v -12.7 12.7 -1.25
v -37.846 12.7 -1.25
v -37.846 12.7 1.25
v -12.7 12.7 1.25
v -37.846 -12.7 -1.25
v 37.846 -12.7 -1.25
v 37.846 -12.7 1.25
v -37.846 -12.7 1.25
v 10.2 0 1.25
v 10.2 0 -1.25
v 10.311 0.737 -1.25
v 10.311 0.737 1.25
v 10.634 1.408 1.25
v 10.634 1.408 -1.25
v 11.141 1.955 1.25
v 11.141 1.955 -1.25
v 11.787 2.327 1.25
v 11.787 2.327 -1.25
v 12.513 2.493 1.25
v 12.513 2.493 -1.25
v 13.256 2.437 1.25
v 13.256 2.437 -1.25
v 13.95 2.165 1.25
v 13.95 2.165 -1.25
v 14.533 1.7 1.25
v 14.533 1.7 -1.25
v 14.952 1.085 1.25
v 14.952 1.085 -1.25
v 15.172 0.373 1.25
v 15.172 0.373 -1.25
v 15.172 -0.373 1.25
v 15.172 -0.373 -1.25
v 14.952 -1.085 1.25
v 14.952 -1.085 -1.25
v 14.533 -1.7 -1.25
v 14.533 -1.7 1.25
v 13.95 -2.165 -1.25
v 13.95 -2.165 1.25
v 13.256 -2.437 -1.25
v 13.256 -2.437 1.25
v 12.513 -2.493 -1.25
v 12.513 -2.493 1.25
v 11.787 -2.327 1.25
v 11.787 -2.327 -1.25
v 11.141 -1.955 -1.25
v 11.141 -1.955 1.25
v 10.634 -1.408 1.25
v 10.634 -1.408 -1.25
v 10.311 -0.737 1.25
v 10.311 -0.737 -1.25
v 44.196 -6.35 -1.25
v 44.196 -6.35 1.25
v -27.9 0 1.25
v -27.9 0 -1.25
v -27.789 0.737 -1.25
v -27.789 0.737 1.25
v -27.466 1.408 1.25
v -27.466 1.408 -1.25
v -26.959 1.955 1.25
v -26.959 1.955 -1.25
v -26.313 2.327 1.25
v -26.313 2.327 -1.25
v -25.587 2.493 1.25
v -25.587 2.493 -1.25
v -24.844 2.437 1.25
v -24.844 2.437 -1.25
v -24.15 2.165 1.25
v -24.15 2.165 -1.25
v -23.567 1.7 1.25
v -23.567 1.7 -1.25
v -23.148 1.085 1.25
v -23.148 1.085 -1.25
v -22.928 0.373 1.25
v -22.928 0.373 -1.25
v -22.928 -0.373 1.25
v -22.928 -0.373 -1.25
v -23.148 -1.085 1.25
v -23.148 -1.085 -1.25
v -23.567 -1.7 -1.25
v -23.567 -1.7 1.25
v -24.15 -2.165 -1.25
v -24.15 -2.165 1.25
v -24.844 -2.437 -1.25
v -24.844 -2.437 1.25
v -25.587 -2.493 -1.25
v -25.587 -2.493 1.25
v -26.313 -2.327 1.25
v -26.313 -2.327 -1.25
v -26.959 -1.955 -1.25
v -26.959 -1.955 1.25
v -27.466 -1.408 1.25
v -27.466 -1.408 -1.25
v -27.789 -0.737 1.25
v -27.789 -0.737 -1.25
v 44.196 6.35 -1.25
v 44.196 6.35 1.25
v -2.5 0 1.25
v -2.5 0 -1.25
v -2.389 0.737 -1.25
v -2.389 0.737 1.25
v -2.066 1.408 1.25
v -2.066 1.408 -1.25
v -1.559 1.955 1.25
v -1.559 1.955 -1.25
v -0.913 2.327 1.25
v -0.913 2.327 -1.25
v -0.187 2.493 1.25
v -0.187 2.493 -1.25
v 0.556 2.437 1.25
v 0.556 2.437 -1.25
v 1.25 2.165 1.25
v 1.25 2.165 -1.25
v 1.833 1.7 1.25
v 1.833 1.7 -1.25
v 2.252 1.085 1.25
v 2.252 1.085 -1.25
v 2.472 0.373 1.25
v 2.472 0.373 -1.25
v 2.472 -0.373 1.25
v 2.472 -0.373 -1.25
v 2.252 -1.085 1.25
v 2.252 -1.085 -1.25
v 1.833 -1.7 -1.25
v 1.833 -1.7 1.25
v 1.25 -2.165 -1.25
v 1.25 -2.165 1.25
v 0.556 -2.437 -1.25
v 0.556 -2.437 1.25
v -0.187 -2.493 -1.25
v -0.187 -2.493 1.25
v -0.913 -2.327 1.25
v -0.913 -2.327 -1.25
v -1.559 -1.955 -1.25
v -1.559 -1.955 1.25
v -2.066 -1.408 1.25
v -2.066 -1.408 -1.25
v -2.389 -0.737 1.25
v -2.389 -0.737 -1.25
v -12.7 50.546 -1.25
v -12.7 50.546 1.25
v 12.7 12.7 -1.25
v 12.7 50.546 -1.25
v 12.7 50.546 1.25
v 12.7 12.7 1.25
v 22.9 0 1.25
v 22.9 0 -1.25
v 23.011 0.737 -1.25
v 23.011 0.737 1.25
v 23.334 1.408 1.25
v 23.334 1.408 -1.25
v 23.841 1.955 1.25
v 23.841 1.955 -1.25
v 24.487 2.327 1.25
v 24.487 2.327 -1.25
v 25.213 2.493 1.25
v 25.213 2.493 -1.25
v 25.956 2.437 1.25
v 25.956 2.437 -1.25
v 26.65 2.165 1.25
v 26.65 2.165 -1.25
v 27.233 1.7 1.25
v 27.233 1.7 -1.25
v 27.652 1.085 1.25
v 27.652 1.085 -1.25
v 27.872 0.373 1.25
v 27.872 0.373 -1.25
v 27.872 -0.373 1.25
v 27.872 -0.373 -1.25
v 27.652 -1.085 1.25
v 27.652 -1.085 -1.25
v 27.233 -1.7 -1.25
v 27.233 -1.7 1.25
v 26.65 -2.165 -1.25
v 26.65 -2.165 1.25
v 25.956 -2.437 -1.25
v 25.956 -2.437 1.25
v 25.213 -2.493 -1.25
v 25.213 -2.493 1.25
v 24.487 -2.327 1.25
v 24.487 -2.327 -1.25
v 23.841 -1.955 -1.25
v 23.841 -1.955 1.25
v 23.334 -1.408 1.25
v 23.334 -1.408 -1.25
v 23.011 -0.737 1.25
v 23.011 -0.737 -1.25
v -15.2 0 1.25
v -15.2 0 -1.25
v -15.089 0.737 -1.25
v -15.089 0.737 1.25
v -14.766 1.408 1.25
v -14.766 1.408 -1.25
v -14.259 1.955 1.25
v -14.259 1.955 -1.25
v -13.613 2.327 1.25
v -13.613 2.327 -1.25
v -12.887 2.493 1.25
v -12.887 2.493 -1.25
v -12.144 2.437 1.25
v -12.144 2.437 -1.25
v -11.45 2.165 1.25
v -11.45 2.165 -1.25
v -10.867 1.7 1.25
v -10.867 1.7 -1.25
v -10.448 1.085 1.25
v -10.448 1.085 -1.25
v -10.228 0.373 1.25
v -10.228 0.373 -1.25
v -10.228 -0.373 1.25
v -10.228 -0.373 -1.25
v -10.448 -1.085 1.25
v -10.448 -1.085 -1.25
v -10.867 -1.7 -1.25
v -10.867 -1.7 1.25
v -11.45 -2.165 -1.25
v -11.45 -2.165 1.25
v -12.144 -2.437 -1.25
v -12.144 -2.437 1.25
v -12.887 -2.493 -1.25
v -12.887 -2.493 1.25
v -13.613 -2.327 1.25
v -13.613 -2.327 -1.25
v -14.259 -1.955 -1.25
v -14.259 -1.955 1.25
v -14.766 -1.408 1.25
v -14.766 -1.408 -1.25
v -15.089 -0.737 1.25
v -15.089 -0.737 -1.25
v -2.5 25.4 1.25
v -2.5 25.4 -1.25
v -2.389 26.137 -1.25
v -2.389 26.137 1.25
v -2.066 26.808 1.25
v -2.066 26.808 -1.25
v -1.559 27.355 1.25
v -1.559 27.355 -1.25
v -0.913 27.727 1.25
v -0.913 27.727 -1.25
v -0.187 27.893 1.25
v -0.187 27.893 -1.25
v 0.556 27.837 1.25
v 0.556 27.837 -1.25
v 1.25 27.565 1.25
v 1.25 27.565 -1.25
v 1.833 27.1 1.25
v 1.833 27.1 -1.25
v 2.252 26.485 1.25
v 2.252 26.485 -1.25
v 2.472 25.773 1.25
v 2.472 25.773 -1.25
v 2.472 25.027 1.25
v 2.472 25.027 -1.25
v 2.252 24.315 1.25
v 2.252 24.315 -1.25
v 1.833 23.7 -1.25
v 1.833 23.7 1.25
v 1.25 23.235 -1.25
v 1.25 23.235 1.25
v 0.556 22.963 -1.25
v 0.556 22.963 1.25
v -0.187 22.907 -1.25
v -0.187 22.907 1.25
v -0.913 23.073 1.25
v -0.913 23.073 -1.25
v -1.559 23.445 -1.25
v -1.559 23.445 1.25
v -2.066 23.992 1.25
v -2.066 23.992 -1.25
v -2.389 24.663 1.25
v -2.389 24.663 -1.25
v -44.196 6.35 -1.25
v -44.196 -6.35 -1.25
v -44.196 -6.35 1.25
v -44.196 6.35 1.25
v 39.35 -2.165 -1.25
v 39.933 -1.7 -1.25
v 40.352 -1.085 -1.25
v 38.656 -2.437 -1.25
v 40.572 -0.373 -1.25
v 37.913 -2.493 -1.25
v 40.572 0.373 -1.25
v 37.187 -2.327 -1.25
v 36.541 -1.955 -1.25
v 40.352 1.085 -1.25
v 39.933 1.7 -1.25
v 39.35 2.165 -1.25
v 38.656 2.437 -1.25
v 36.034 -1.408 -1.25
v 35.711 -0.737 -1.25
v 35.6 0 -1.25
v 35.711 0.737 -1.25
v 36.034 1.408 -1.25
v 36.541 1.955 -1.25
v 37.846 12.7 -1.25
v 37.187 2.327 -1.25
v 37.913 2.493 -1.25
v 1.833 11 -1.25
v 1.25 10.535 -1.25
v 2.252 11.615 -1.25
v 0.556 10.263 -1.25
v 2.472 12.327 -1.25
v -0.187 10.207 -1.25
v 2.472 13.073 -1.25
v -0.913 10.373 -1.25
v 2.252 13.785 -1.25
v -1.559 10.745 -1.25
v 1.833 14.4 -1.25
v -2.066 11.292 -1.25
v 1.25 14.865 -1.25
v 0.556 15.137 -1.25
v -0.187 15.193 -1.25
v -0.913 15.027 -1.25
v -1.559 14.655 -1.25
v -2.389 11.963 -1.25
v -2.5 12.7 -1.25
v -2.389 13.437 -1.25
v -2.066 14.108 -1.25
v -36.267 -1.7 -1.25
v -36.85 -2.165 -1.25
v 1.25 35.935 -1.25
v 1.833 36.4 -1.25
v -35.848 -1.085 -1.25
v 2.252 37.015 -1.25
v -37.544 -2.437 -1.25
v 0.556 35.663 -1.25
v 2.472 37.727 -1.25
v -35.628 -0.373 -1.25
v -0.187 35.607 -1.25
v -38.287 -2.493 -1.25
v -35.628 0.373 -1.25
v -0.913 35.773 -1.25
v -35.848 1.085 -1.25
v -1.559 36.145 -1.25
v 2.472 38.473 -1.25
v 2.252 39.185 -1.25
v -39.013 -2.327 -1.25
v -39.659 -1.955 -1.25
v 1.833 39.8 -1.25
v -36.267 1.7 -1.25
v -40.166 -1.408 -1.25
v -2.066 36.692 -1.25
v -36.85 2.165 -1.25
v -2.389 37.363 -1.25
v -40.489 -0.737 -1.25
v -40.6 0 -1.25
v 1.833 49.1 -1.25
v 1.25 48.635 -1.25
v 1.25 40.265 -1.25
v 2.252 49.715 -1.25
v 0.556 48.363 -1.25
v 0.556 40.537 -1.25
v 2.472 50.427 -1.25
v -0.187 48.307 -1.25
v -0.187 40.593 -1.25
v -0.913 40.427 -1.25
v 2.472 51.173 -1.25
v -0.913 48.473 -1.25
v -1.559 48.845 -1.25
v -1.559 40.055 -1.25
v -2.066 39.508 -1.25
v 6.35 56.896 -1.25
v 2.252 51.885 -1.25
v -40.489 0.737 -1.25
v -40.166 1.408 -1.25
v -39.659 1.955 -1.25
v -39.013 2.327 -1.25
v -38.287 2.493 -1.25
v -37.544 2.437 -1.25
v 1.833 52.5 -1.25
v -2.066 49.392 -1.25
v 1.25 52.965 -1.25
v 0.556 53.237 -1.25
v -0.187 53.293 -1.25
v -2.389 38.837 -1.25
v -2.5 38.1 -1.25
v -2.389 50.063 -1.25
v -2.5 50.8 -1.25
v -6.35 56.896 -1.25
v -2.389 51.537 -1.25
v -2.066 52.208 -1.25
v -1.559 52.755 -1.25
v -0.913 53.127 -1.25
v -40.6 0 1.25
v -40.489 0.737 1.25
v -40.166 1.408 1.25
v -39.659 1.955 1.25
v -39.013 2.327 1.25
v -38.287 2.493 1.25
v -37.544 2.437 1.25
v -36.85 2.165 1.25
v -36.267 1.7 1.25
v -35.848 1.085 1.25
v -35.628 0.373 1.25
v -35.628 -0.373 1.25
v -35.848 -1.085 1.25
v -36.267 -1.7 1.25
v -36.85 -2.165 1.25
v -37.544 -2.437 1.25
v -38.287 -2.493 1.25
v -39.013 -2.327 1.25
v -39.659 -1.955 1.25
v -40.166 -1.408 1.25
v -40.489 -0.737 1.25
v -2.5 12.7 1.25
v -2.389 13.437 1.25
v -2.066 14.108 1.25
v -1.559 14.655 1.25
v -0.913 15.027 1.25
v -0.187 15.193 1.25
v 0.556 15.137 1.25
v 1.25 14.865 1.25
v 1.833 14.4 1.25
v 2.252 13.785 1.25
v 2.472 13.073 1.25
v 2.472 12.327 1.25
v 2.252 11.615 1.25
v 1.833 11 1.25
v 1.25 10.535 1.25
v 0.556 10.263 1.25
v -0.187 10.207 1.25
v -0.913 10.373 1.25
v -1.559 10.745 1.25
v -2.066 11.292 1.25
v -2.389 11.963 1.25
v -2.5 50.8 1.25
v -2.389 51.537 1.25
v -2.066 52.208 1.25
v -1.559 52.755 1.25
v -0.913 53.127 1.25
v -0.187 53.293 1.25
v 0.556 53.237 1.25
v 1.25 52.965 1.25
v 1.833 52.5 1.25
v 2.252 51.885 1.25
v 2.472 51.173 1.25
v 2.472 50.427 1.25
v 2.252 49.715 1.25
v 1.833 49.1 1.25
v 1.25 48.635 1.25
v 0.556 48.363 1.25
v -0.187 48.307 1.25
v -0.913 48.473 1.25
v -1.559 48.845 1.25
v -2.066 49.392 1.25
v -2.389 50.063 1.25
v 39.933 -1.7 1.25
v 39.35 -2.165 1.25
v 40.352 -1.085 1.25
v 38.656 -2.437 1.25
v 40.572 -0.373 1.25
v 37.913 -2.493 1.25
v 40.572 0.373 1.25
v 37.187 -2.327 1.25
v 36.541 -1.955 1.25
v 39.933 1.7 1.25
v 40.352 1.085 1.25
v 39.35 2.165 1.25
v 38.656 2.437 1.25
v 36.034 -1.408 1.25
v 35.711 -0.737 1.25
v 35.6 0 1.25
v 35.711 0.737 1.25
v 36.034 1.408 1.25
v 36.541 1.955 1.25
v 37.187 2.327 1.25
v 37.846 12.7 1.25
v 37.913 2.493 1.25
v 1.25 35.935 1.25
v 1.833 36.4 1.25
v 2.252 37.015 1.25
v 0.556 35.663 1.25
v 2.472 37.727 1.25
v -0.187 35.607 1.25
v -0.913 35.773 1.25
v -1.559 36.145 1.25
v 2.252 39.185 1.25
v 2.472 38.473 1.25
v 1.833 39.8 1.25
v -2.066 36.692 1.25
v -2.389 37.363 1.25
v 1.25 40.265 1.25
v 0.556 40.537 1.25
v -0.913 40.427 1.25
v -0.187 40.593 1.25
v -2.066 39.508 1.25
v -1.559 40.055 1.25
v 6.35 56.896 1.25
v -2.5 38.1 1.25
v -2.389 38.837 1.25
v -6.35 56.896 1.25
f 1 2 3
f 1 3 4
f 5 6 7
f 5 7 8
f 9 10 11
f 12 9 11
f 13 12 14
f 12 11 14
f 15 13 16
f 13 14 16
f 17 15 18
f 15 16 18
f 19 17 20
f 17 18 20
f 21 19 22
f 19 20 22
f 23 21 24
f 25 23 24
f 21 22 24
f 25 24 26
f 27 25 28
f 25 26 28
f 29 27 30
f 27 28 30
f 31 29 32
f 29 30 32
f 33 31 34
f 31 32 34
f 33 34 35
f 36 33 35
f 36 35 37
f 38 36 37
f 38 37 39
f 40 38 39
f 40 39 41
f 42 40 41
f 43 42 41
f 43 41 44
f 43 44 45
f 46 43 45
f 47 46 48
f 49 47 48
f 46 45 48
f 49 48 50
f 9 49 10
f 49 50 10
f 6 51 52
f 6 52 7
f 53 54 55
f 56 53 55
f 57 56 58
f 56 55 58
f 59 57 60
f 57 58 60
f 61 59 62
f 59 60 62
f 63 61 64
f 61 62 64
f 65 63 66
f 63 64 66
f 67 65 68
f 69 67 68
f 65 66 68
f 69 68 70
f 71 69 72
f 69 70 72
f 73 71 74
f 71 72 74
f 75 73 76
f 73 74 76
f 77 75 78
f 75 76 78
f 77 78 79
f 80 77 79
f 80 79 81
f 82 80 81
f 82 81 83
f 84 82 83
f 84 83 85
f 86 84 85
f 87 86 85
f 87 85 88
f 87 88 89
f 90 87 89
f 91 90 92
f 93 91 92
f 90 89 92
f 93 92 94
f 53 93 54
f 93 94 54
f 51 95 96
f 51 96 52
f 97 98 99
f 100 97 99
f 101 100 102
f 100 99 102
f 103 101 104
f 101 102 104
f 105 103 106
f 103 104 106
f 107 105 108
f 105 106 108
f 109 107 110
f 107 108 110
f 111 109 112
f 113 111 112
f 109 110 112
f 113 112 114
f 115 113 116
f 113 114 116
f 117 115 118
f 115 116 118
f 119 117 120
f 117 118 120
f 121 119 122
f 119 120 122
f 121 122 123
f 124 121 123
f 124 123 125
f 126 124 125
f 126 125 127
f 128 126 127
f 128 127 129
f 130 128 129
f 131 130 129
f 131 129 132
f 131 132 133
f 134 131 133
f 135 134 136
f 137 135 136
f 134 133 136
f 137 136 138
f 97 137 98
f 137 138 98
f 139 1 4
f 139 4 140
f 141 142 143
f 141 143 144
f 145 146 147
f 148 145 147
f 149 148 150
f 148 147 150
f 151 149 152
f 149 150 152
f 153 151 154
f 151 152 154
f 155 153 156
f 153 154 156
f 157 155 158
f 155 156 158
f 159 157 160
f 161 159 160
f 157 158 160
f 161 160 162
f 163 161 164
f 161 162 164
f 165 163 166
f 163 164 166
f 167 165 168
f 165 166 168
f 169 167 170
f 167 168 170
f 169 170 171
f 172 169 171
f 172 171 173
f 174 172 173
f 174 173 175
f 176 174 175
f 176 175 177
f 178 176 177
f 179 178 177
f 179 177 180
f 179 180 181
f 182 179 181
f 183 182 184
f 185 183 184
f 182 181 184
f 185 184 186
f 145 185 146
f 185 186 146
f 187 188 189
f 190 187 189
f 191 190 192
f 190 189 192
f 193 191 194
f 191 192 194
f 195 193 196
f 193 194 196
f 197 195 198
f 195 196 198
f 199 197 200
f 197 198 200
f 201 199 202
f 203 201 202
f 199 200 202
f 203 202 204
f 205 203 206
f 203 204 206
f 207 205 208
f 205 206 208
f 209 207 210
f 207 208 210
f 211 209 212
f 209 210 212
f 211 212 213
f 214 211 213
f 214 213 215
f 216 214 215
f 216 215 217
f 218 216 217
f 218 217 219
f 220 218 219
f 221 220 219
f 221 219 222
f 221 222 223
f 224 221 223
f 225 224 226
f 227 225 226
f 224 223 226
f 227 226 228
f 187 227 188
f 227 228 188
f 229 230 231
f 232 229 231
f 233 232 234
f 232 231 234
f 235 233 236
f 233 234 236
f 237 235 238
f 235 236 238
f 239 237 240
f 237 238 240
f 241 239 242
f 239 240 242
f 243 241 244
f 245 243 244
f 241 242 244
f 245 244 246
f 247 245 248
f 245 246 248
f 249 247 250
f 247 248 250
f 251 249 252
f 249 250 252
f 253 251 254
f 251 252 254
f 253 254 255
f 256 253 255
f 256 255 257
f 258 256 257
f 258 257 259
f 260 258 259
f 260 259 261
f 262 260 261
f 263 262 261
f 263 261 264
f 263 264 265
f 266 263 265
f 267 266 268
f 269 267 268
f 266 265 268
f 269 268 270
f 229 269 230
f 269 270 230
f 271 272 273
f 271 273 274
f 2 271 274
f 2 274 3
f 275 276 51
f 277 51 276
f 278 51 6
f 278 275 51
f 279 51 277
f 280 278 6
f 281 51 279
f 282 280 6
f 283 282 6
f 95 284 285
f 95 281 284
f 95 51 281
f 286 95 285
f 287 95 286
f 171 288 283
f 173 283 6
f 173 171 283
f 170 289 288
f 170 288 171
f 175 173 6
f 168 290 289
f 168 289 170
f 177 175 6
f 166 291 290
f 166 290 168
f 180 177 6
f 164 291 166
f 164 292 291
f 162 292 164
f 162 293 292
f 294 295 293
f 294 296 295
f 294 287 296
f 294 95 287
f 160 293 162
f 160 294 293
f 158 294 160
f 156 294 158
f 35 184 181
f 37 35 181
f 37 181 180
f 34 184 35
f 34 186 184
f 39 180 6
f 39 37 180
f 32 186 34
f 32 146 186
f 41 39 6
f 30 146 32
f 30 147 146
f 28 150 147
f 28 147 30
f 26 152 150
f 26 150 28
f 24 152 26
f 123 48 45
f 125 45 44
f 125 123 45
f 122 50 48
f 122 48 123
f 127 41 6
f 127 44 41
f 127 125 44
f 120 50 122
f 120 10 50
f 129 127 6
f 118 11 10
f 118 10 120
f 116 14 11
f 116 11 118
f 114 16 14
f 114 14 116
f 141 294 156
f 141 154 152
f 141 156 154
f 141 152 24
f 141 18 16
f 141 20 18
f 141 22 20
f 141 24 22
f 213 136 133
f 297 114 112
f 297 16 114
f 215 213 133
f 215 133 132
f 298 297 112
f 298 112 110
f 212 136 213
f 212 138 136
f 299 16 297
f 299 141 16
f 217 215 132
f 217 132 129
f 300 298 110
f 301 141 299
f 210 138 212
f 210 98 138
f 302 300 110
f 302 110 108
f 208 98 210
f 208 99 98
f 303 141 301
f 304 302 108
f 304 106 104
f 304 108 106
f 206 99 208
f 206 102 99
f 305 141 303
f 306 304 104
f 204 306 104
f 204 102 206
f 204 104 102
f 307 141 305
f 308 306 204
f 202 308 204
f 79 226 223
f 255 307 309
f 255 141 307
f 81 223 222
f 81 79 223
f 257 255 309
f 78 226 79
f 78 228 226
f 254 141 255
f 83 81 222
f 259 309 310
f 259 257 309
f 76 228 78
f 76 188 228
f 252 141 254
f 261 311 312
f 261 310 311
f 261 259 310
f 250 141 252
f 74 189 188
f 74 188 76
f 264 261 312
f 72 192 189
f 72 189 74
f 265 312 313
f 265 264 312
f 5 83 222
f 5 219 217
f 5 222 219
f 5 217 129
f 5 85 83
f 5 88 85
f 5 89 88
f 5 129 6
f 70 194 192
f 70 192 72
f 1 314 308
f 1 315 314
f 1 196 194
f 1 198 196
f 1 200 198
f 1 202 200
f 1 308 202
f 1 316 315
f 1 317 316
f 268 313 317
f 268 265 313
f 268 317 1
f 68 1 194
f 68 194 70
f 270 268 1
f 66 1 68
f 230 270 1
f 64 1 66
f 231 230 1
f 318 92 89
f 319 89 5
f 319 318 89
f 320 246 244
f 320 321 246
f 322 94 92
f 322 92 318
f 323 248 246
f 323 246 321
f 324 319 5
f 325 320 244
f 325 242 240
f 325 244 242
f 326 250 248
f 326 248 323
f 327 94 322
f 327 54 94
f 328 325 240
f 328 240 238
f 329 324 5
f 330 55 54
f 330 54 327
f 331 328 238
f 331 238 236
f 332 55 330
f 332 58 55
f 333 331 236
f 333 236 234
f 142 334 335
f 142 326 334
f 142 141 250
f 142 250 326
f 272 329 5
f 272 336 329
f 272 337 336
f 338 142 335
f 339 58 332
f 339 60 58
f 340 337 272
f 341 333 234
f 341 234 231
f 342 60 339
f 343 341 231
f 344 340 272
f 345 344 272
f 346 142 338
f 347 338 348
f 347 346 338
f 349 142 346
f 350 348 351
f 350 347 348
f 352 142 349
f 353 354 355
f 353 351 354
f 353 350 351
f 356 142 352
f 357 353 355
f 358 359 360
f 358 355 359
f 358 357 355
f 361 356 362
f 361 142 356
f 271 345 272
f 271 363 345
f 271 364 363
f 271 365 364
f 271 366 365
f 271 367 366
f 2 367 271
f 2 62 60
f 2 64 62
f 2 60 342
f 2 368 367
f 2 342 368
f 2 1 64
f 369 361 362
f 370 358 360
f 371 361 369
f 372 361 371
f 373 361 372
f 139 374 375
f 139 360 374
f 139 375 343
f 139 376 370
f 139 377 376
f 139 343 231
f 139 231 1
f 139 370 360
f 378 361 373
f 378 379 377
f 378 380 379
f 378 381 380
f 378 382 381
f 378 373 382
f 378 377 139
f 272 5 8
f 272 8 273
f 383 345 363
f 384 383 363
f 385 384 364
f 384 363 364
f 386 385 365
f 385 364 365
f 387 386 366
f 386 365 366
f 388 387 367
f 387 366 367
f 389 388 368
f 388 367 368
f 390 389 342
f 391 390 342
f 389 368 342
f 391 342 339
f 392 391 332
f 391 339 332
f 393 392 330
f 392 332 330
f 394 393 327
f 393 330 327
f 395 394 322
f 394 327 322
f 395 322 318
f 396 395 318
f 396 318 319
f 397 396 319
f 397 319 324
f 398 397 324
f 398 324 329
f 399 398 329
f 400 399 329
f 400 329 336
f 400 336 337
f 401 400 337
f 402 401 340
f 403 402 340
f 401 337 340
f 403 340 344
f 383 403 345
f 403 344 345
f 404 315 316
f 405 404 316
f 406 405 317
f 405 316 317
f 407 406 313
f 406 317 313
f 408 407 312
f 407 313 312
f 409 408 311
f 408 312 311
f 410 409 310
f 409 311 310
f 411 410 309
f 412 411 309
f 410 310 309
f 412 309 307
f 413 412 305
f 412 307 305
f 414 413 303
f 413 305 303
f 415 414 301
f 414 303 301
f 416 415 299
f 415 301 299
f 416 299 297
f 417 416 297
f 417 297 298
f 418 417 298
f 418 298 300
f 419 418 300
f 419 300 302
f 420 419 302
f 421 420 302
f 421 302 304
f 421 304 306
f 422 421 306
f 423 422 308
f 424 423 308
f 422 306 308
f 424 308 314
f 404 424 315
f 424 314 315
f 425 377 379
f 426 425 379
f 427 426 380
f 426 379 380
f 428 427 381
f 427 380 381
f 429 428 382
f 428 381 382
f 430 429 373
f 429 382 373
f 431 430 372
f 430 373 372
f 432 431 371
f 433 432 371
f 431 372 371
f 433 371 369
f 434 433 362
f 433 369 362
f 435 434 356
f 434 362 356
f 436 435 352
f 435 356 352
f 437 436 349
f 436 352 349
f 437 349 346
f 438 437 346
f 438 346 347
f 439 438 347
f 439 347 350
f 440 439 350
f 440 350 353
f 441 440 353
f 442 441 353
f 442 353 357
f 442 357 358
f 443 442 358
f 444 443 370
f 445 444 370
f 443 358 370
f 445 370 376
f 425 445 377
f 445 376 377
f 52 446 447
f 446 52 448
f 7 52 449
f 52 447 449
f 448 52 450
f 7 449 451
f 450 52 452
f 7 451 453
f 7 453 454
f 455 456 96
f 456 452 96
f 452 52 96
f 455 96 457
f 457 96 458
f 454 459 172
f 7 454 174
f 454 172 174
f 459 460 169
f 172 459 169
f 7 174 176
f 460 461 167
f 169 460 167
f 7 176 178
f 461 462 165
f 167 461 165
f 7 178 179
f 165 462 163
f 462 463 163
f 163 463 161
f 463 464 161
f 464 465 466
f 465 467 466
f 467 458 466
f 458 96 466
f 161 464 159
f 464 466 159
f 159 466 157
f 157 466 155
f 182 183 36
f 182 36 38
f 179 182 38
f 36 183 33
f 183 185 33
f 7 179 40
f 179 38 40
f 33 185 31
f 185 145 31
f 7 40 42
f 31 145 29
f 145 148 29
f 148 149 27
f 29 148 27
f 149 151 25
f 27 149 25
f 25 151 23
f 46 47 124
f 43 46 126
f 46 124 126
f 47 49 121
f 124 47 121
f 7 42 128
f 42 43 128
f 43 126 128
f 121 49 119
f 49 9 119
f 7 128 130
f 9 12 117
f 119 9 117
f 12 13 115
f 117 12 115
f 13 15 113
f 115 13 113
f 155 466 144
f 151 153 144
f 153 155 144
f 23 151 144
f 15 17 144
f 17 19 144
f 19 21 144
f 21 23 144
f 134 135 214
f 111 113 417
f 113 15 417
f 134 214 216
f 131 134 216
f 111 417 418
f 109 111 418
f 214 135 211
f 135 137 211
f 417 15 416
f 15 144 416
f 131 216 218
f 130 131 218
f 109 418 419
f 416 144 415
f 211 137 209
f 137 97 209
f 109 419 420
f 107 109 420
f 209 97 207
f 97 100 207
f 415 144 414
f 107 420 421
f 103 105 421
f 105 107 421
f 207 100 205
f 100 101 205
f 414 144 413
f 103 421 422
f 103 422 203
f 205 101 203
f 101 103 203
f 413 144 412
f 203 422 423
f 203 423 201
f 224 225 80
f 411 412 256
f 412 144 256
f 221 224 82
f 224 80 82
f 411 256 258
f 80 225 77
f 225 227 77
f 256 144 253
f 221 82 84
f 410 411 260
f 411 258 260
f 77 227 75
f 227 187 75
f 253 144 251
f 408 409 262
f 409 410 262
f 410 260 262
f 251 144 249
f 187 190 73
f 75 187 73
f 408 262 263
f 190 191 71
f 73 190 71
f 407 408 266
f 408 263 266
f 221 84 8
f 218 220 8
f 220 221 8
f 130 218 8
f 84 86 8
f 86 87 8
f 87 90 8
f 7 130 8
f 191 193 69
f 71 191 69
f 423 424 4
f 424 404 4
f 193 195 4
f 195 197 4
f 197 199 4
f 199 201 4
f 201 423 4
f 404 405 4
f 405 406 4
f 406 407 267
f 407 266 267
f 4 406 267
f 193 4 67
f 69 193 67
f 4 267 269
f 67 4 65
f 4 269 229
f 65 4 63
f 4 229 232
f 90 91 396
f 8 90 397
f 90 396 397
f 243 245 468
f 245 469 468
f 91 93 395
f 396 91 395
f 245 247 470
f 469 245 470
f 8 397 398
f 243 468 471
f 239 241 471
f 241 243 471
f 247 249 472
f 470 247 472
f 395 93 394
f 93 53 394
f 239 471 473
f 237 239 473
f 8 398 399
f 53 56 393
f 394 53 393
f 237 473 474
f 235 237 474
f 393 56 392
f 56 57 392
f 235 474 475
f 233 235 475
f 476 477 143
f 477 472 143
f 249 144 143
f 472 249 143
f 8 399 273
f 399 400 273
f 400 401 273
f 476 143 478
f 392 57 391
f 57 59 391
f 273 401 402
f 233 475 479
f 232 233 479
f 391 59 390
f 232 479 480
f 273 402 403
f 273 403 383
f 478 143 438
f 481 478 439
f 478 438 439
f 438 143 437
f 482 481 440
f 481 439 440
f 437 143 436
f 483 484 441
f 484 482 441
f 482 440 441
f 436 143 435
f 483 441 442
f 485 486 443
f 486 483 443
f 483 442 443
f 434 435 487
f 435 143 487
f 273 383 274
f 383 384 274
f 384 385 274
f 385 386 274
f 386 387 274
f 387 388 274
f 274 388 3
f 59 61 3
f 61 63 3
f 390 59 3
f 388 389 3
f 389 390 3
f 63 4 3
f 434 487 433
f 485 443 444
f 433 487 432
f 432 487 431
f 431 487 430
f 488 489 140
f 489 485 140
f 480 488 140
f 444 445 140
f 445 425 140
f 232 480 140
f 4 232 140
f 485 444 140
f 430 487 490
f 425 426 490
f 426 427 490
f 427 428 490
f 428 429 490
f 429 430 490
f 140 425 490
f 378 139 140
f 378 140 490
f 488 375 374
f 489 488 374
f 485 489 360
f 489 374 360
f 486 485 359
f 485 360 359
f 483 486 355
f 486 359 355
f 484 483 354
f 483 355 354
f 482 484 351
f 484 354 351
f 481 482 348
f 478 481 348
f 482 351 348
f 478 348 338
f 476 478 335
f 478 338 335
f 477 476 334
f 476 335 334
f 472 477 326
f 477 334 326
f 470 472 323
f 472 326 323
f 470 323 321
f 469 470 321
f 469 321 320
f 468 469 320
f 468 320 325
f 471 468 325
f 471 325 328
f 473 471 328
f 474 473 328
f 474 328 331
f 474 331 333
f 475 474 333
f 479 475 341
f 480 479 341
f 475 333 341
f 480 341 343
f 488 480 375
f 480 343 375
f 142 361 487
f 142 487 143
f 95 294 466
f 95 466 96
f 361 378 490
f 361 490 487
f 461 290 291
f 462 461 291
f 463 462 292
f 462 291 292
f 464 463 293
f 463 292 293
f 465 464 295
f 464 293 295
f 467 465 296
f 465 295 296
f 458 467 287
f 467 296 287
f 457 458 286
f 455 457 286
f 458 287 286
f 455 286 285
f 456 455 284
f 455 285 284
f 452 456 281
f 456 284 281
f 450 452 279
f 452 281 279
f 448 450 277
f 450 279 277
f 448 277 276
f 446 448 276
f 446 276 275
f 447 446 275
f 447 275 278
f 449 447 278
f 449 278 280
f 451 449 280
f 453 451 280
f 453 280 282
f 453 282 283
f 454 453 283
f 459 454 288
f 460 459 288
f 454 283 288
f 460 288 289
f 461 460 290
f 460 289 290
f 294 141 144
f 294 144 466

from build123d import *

# Parameters (mm, degrees)
SKETCH1_R           = 2.5
BOSS_EXTRUDE1_DEPTH = 2.5


with BuildPart() as part:
    # Sketch1 → Boss-Extrude1 (new body)
    with BuildSketch(Plane(origin=(0, 0, -1.25), x_dir=(-1, 0, 0), z_dir=(0, 0, -1))):
        Polygon((12.7, 12.7), (12.7, 50.546), (6.35, 56.896), (-6.35, 56.896), (-12.7, 50.546), (-12.7, 12.7), (-37.846, 12.7), (-44.196, 6.35), (-44.196, -6.35), (-37.846, -12.7), (37.846, -12.7), (44.196, -6.35), (44.196, 6.35), (37.846, 12.7), align=None)
        with Locations((0, 50.8)):
            Circle(SKETCH1_R, mode=Mode.SUBTRACT)
        with Locations((0, 38.1)):
            Circle(SKETCH1_R, mode=Mode.SUBTRACT)
        with Locations((-38.1, 0)):
            Circle(SKETCH1_R, mode=Mode.SUBTRACT)
        with Locations((-25.4, 0)):
            Circle(SKETCH1_R, mode=Mode.SUBTRACT)
        with Locations((-12.7, 0)):
            Circle(SKETCH1_R, mode=Mode.SUBTRACT)
        Circle(SKETCH1_R, mode=Mode.SUBTRACT)
        with Locations((12.7, 0)):
            Circle(SKETCH1_R, mode=Mode.SUBTRACT)
        with Locations((38.1, 0)):
            Circle(SKETCH1_R, mode=Mode.SUBTRACT)
        with Locations((25.4, 0)):
            Circle(SKETCH1_R, mode=Mode.SUBTRACT)
        with Locations((0, 12.7)):
            Circle(SKETCH1_R, mode=Mode.SUBTRACT)
        with Locations((0, 25.4)):
            Circle(SKETCH1_R, mode=Mode.SUBTRACT)
    extrude(amount=-BOSS_EXTRUDE1_DEPTH)


solid = part.part
